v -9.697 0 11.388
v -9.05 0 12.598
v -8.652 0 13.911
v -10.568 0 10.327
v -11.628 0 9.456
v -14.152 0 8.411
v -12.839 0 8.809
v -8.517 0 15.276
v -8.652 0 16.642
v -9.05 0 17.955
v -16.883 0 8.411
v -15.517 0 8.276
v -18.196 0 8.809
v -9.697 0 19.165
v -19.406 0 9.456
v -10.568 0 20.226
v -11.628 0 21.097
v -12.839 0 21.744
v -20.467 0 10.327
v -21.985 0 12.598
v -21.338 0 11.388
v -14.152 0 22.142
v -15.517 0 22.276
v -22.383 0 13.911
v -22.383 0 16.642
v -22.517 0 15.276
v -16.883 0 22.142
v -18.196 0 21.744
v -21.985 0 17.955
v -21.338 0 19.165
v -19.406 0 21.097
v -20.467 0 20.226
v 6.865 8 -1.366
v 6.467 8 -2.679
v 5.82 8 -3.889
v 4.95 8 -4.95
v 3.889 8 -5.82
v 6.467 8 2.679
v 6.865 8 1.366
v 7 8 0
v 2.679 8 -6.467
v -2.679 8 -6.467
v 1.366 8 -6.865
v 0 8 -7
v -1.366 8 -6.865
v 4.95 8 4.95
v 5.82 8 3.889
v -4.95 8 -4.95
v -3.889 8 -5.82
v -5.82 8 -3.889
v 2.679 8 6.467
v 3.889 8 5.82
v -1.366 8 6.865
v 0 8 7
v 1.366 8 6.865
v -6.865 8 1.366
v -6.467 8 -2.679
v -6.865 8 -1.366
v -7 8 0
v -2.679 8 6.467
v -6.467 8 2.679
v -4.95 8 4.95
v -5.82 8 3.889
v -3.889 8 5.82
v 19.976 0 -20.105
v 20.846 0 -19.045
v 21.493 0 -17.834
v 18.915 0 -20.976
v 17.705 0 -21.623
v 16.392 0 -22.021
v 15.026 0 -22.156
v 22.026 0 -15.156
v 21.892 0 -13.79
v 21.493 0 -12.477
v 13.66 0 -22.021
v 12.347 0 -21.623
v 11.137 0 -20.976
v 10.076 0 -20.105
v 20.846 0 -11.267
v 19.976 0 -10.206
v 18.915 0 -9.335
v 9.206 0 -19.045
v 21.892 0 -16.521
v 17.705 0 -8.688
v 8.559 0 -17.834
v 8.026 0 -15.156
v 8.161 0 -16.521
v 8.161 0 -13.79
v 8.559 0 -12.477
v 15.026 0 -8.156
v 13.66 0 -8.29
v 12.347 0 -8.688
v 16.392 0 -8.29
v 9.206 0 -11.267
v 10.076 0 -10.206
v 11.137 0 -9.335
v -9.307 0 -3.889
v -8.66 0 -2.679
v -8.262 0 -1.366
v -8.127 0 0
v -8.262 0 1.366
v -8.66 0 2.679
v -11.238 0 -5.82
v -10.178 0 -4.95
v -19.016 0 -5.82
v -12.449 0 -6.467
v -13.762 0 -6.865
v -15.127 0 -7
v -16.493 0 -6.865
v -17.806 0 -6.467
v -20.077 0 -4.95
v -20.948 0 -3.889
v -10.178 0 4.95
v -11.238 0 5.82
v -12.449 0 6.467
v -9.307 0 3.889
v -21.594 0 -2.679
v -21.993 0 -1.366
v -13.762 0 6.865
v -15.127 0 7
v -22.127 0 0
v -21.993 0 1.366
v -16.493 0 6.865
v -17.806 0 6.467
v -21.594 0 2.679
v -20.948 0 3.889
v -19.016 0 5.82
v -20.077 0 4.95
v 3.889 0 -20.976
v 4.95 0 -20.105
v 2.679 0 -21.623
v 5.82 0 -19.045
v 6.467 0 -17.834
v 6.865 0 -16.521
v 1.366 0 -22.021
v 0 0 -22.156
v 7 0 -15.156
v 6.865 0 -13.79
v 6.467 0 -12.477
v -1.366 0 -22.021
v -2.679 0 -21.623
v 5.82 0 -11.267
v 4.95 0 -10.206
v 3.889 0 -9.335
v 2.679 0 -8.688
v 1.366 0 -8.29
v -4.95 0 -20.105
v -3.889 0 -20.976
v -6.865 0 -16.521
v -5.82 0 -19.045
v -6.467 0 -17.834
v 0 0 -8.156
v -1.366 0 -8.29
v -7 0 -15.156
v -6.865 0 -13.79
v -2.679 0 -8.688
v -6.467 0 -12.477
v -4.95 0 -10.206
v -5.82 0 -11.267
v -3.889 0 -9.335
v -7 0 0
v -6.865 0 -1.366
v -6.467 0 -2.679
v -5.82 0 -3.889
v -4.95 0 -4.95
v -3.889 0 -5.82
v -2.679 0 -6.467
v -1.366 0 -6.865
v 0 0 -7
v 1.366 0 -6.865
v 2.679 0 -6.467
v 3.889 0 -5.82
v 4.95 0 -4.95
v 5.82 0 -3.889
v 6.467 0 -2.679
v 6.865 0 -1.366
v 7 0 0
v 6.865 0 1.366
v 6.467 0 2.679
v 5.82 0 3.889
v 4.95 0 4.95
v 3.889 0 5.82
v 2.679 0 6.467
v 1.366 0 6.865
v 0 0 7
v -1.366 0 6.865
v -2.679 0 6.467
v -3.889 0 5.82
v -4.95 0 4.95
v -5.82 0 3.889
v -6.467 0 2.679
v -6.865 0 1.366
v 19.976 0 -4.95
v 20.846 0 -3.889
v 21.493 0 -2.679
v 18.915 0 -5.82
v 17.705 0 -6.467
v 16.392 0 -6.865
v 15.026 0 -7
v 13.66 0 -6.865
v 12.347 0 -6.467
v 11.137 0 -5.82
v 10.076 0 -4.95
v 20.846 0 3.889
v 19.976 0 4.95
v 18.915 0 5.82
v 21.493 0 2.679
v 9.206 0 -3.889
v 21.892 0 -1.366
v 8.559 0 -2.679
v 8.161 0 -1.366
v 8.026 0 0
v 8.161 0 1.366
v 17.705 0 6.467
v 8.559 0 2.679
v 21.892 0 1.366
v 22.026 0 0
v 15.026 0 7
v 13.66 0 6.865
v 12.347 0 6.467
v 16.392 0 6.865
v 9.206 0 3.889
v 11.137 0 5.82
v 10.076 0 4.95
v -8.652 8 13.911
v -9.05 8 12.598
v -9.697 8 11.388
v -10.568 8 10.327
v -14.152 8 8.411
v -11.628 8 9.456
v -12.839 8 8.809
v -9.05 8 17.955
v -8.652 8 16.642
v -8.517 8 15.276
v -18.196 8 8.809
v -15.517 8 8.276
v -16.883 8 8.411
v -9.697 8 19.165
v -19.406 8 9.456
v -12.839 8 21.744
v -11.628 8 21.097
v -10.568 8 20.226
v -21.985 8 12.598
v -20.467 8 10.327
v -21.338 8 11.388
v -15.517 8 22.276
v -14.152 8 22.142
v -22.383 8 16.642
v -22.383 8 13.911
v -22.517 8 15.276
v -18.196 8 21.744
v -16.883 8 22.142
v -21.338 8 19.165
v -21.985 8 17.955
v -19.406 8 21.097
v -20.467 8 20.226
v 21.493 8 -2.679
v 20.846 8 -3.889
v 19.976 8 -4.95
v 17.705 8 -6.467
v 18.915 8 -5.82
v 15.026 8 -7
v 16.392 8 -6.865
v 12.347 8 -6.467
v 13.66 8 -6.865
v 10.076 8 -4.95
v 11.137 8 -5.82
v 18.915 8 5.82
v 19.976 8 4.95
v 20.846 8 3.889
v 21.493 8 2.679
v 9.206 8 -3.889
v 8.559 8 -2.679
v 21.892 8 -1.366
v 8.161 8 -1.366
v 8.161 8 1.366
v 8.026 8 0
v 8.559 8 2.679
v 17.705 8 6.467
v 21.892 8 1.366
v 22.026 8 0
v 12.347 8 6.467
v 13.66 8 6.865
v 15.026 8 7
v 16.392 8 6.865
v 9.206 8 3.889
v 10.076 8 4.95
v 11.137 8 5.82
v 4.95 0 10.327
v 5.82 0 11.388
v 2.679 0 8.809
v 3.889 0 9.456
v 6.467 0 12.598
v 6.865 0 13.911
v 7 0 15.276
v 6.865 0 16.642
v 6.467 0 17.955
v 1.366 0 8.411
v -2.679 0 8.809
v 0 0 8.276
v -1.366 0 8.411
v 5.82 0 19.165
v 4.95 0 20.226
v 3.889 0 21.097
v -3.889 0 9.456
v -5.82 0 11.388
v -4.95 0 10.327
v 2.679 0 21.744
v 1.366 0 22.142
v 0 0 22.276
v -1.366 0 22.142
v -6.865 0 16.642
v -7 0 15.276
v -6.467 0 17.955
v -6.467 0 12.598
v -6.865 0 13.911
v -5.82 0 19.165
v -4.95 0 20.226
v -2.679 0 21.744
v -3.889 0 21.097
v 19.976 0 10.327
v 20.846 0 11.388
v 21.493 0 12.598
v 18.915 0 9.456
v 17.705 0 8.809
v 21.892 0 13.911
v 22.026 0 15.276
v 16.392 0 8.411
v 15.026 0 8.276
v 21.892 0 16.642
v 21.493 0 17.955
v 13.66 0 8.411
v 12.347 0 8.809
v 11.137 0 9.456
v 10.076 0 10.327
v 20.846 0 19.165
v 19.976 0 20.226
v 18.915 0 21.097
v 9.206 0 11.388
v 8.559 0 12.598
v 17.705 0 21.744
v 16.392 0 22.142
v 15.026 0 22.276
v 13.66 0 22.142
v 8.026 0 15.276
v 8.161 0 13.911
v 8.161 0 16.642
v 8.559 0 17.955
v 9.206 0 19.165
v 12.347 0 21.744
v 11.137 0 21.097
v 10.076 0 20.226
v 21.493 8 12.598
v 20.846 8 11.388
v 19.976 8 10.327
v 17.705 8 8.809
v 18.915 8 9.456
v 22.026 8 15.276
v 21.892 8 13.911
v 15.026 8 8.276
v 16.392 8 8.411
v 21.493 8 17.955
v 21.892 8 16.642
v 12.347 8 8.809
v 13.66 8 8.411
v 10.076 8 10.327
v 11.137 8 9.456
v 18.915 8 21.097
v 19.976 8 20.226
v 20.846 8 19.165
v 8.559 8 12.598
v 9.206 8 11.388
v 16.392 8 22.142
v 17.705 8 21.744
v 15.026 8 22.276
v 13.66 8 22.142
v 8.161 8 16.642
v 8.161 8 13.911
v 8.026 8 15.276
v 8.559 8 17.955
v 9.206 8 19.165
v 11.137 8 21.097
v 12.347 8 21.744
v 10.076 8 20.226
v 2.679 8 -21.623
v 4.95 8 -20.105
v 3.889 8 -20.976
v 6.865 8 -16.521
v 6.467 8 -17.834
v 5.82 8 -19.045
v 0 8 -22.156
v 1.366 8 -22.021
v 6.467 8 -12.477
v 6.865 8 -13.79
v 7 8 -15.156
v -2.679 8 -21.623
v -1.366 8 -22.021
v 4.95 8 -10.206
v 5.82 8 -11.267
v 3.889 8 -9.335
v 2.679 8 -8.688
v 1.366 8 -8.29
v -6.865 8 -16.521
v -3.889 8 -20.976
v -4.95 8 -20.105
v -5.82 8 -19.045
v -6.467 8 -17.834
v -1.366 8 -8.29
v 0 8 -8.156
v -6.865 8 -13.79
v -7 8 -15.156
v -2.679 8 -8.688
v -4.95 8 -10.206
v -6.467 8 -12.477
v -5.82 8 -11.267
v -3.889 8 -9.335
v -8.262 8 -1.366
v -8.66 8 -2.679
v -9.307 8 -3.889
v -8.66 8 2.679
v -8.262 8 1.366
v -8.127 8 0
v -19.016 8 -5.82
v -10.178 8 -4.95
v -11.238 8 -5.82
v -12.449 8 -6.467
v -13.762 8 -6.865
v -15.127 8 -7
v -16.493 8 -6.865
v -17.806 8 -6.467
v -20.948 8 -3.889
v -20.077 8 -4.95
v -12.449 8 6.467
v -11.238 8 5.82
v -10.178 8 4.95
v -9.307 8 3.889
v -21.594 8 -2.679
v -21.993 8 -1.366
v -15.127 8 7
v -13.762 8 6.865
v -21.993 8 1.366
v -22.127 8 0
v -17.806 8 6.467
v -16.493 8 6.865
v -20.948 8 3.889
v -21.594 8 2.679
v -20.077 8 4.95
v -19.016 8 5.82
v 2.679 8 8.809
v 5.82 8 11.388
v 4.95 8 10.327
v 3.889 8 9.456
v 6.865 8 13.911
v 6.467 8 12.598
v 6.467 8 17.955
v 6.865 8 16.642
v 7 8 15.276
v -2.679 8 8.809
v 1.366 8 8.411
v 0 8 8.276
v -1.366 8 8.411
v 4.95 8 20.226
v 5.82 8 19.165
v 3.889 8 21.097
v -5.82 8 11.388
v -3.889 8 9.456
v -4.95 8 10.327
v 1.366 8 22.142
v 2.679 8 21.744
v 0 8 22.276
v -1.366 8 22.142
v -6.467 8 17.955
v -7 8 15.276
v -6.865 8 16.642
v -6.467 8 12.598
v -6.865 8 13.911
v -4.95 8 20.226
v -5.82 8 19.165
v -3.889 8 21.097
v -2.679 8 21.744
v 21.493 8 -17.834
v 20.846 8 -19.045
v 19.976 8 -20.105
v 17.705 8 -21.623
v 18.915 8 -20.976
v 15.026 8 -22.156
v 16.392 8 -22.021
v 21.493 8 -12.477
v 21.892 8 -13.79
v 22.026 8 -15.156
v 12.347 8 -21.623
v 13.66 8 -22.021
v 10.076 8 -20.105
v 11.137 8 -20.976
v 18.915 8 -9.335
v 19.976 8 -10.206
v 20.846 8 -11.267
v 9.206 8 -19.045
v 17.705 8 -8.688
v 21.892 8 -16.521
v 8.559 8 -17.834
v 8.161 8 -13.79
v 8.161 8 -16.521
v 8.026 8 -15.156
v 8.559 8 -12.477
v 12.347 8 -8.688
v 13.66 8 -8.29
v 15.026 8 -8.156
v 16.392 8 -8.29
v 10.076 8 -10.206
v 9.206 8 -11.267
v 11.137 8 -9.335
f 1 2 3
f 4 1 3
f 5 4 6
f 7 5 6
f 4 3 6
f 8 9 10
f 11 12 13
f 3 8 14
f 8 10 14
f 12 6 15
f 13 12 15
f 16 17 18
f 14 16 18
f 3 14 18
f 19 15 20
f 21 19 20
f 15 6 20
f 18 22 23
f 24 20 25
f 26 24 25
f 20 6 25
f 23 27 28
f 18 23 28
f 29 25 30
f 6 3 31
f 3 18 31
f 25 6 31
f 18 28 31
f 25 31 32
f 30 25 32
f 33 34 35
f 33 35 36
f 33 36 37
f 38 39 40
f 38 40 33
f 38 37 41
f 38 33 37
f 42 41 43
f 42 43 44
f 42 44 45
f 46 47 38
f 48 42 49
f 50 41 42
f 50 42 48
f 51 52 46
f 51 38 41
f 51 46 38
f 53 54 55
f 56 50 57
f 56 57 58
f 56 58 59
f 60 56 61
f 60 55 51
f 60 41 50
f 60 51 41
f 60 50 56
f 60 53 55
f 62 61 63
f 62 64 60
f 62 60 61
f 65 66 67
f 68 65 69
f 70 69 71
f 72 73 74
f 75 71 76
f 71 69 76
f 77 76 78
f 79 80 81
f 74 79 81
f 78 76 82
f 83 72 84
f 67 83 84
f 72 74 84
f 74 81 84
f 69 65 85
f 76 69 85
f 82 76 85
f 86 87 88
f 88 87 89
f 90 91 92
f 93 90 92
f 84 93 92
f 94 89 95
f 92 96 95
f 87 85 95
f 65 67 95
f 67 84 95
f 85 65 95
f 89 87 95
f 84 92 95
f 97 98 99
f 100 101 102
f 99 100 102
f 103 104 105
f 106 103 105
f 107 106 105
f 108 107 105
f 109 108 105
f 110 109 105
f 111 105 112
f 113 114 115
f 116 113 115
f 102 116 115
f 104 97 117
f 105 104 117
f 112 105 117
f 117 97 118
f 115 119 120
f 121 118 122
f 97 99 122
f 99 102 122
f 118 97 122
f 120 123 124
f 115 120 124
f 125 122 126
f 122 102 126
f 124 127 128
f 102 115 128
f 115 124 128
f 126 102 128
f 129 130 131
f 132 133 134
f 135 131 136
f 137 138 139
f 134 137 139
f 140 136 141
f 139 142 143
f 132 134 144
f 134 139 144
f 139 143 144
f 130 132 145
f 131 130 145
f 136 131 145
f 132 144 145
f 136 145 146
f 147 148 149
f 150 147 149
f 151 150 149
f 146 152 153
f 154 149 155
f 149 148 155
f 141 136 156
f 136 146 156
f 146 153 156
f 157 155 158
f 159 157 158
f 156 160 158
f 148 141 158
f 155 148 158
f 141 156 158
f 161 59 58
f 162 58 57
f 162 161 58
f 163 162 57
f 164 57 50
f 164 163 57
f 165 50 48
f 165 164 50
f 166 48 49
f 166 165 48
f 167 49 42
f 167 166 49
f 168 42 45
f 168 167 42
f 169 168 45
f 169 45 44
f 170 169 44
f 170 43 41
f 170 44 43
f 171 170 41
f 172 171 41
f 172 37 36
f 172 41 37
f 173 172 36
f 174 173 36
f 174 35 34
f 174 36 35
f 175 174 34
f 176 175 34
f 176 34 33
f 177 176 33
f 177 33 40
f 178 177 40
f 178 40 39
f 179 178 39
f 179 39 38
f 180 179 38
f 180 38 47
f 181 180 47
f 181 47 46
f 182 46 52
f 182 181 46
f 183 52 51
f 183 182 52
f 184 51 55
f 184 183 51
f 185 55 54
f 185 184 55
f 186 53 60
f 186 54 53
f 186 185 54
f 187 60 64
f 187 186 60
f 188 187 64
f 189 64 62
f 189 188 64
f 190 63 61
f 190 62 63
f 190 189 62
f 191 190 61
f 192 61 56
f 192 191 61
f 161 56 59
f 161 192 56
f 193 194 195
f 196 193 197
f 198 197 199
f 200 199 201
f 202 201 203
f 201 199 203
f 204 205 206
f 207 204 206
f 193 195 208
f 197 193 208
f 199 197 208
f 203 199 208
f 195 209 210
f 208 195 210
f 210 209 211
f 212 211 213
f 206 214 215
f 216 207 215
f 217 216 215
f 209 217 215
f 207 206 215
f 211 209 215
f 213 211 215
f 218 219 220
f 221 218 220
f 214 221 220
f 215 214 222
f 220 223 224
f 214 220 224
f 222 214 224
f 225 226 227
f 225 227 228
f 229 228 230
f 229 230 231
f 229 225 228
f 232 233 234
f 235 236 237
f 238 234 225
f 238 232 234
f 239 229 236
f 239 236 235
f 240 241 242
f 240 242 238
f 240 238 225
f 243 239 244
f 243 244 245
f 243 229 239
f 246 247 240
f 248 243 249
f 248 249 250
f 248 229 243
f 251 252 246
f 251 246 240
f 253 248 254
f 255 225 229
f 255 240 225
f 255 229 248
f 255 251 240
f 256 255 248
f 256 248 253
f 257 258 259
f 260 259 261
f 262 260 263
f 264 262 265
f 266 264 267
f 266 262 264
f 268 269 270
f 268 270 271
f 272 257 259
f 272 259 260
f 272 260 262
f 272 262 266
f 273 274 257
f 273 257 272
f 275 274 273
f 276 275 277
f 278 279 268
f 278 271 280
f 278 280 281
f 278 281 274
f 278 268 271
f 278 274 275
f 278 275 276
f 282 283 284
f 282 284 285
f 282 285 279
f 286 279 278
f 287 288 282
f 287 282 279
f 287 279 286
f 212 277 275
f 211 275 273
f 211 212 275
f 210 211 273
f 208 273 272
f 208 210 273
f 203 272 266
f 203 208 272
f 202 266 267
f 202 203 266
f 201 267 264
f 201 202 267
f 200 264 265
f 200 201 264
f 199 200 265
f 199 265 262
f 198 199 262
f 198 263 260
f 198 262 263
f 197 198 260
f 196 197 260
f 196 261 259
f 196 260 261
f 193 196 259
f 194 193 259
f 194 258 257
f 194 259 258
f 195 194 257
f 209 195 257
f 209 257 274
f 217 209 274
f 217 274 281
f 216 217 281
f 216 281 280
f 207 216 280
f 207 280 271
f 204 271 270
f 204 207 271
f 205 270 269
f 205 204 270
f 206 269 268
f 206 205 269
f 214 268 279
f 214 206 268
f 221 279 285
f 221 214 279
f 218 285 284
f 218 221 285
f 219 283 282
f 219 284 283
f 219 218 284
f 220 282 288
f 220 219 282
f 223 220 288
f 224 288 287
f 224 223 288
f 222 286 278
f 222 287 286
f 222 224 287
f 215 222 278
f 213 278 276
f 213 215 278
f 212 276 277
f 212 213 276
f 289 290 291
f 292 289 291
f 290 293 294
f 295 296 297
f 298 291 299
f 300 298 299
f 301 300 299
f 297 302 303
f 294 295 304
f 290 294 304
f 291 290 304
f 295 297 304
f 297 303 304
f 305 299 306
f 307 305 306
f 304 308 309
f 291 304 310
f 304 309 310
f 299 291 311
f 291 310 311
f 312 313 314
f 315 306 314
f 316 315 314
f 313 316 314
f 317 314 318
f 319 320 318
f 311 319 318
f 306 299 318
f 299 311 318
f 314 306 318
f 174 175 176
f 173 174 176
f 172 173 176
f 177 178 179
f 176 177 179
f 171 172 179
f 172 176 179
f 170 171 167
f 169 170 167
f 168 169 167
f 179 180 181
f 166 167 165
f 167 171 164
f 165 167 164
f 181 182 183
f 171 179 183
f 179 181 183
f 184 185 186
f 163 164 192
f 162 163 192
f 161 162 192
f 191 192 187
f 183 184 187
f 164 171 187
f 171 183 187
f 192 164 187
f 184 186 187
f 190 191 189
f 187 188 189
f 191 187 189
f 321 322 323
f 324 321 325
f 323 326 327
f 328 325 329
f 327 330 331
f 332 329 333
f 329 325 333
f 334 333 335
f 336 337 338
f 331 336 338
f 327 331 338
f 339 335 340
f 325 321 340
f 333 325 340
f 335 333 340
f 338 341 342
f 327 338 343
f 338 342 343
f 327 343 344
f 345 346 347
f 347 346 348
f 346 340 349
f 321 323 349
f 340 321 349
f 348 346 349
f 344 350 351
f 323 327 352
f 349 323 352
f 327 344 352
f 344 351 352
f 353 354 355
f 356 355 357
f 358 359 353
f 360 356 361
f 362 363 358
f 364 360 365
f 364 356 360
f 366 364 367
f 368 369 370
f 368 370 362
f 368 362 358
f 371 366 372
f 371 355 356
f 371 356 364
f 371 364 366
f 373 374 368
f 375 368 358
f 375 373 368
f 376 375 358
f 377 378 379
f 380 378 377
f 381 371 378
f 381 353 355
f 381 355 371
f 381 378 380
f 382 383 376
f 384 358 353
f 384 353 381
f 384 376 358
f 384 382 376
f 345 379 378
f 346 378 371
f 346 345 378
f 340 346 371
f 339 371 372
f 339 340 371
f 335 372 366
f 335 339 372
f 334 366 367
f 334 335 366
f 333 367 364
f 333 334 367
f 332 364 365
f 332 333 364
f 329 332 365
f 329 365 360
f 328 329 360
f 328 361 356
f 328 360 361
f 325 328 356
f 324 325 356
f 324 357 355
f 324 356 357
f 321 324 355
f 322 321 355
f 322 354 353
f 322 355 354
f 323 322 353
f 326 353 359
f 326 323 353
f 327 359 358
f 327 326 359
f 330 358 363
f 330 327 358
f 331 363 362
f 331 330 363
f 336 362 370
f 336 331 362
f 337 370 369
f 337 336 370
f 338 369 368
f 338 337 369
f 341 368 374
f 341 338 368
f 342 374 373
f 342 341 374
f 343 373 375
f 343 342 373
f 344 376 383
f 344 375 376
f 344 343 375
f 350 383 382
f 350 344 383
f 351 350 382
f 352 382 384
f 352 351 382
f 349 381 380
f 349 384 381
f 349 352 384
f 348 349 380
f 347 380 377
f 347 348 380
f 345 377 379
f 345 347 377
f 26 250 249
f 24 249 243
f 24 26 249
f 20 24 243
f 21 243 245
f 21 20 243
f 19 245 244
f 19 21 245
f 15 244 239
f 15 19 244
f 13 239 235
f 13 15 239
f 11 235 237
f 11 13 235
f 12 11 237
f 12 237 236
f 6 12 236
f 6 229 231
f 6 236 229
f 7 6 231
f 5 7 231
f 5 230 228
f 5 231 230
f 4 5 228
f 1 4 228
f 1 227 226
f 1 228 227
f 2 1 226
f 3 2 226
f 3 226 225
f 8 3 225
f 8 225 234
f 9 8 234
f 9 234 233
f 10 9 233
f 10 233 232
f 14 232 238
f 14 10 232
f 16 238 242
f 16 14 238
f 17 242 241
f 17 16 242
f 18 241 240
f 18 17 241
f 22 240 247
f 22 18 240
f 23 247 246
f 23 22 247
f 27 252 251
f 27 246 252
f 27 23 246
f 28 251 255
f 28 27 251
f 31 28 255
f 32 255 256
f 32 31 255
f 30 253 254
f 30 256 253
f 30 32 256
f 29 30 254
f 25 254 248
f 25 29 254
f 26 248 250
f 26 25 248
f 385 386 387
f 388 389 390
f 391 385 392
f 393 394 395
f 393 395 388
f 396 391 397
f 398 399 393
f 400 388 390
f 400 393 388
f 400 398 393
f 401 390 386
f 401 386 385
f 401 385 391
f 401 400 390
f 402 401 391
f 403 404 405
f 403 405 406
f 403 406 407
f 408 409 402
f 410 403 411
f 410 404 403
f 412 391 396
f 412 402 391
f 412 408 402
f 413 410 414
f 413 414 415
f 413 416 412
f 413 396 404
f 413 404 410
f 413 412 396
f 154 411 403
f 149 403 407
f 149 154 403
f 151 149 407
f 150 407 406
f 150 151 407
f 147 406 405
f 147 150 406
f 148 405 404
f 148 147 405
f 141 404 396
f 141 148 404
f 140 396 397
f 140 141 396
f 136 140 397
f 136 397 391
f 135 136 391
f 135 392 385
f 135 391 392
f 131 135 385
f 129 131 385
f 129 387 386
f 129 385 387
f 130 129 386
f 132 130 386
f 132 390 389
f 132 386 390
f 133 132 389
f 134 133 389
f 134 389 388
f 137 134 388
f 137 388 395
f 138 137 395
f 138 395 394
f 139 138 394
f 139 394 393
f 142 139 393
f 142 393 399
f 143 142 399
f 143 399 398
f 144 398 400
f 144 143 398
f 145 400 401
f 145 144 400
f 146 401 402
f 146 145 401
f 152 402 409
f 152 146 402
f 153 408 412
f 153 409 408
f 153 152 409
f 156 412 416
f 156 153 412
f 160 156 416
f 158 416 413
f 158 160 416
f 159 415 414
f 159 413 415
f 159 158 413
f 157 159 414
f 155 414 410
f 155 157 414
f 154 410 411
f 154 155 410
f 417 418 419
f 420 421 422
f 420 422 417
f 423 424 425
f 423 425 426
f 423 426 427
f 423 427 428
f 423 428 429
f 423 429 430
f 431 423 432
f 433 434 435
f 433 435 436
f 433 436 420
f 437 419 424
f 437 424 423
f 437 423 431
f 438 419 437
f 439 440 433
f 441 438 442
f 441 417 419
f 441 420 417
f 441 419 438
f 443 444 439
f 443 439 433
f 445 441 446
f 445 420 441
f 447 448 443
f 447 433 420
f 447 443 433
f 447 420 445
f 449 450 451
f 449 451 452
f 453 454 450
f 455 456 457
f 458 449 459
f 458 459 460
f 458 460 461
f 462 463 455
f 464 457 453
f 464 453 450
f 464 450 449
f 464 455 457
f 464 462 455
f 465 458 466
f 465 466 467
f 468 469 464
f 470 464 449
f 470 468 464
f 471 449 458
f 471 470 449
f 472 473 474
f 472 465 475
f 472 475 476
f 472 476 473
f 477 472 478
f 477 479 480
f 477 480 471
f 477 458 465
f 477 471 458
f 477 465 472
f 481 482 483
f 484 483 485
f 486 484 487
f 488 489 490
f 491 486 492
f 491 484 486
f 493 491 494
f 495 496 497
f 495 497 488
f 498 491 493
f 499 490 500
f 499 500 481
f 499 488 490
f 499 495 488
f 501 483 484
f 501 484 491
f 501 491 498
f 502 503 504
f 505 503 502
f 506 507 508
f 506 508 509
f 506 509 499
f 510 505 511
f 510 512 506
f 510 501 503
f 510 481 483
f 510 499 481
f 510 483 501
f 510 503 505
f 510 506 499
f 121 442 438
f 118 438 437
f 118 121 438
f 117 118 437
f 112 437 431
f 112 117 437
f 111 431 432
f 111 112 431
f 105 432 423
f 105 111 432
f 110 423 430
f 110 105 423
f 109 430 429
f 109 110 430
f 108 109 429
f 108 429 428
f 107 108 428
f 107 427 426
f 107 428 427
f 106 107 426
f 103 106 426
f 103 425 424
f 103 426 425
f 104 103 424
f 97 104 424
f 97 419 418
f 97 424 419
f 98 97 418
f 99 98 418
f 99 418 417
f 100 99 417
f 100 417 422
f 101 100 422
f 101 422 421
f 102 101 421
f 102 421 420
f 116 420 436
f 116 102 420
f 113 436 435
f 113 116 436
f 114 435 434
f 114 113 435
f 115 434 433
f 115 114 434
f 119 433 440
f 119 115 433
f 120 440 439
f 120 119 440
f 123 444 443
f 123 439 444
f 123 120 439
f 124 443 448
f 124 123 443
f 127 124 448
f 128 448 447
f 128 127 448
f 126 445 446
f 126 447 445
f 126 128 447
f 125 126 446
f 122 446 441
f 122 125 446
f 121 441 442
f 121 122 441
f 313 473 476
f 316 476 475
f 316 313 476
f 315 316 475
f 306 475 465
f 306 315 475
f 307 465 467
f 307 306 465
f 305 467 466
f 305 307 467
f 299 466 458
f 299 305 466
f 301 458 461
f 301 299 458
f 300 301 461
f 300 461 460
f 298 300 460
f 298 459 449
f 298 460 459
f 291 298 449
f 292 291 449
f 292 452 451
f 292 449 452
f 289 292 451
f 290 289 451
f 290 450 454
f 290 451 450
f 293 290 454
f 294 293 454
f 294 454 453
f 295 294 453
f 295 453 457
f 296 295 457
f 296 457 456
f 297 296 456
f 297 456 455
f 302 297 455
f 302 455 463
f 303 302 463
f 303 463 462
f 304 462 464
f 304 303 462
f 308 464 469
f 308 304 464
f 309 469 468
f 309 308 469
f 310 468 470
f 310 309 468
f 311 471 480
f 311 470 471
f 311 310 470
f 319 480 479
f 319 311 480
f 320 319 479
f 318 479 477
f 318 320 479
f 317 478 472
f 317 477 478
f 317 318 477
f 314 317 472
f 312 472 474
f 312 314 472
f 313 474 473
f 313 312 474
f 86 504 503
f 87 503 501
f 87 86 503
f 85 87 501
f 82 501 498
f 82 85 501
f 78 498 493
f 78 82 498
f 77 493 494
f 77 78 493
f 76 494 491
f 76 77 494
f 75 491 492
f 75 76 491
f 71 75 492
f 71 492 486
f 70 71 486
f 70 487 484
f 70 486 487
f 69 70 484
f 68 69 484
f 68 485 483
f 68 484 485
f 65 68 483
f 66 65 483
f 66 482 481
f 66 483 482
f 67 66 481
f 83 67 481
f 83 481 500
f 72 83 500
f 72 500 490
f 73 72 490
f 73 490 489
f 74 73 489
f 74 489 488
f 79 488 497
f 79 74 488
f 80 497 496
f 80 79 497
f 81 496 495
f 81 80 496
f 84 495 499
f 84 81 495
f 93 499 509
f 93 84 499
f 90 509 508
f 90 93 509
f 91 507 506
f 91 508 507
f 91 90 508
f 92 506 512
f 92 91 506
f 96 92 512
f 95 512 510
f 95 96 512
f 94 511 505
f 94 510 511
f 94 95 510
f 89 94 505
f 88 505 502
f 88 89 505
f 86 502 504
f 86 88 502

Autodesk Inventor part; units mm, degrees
ref_plane "YZ Plane" through (0, 0, 0) normal (1, 0, 0) x (0, 1, 0)
ref_plane "XZ Plane" through (0, 0, 0) normal (0, 1, 0) x (-1, 0, 0)
ref_plane "XY Plane" through (0, 0, 0) normal (0, 0, 1) x (1, 0, 0)
sketch "Sketch1" plane through (0, 0, 0) normal (0, 1, 0) x (-1, 0, 0)
  circle A0 centre (0, 0) radius 7
  circle A1 centre (15.1273, 0) radius 7
  circle A2 centre (-15.0261, 0) radius 7
  circle A3 centre (0, -15.1556) radius 7
  circle A4 centre (0, 15.2765) radius 7
  circle A5 centre (-15.0261, 15.2765) radius 7
  circle A6 centre (15.5174, 15.2765) radius 7
  circle A7 centre (-15.0261, -15.1556) radius 7
  dimension "d0" = 14
  dimension "d1" = 14
  dimension "d2" = 14
  dimension "d3" = 14
  dimension "d4" = 14
  dimension "d5" = 14
  dimension "d6" = 14
  dimension "d7" = 14
extrude "Extrusion1" add sketch "Sketch1" along normal blind 8
properties part number "BUTTON"
